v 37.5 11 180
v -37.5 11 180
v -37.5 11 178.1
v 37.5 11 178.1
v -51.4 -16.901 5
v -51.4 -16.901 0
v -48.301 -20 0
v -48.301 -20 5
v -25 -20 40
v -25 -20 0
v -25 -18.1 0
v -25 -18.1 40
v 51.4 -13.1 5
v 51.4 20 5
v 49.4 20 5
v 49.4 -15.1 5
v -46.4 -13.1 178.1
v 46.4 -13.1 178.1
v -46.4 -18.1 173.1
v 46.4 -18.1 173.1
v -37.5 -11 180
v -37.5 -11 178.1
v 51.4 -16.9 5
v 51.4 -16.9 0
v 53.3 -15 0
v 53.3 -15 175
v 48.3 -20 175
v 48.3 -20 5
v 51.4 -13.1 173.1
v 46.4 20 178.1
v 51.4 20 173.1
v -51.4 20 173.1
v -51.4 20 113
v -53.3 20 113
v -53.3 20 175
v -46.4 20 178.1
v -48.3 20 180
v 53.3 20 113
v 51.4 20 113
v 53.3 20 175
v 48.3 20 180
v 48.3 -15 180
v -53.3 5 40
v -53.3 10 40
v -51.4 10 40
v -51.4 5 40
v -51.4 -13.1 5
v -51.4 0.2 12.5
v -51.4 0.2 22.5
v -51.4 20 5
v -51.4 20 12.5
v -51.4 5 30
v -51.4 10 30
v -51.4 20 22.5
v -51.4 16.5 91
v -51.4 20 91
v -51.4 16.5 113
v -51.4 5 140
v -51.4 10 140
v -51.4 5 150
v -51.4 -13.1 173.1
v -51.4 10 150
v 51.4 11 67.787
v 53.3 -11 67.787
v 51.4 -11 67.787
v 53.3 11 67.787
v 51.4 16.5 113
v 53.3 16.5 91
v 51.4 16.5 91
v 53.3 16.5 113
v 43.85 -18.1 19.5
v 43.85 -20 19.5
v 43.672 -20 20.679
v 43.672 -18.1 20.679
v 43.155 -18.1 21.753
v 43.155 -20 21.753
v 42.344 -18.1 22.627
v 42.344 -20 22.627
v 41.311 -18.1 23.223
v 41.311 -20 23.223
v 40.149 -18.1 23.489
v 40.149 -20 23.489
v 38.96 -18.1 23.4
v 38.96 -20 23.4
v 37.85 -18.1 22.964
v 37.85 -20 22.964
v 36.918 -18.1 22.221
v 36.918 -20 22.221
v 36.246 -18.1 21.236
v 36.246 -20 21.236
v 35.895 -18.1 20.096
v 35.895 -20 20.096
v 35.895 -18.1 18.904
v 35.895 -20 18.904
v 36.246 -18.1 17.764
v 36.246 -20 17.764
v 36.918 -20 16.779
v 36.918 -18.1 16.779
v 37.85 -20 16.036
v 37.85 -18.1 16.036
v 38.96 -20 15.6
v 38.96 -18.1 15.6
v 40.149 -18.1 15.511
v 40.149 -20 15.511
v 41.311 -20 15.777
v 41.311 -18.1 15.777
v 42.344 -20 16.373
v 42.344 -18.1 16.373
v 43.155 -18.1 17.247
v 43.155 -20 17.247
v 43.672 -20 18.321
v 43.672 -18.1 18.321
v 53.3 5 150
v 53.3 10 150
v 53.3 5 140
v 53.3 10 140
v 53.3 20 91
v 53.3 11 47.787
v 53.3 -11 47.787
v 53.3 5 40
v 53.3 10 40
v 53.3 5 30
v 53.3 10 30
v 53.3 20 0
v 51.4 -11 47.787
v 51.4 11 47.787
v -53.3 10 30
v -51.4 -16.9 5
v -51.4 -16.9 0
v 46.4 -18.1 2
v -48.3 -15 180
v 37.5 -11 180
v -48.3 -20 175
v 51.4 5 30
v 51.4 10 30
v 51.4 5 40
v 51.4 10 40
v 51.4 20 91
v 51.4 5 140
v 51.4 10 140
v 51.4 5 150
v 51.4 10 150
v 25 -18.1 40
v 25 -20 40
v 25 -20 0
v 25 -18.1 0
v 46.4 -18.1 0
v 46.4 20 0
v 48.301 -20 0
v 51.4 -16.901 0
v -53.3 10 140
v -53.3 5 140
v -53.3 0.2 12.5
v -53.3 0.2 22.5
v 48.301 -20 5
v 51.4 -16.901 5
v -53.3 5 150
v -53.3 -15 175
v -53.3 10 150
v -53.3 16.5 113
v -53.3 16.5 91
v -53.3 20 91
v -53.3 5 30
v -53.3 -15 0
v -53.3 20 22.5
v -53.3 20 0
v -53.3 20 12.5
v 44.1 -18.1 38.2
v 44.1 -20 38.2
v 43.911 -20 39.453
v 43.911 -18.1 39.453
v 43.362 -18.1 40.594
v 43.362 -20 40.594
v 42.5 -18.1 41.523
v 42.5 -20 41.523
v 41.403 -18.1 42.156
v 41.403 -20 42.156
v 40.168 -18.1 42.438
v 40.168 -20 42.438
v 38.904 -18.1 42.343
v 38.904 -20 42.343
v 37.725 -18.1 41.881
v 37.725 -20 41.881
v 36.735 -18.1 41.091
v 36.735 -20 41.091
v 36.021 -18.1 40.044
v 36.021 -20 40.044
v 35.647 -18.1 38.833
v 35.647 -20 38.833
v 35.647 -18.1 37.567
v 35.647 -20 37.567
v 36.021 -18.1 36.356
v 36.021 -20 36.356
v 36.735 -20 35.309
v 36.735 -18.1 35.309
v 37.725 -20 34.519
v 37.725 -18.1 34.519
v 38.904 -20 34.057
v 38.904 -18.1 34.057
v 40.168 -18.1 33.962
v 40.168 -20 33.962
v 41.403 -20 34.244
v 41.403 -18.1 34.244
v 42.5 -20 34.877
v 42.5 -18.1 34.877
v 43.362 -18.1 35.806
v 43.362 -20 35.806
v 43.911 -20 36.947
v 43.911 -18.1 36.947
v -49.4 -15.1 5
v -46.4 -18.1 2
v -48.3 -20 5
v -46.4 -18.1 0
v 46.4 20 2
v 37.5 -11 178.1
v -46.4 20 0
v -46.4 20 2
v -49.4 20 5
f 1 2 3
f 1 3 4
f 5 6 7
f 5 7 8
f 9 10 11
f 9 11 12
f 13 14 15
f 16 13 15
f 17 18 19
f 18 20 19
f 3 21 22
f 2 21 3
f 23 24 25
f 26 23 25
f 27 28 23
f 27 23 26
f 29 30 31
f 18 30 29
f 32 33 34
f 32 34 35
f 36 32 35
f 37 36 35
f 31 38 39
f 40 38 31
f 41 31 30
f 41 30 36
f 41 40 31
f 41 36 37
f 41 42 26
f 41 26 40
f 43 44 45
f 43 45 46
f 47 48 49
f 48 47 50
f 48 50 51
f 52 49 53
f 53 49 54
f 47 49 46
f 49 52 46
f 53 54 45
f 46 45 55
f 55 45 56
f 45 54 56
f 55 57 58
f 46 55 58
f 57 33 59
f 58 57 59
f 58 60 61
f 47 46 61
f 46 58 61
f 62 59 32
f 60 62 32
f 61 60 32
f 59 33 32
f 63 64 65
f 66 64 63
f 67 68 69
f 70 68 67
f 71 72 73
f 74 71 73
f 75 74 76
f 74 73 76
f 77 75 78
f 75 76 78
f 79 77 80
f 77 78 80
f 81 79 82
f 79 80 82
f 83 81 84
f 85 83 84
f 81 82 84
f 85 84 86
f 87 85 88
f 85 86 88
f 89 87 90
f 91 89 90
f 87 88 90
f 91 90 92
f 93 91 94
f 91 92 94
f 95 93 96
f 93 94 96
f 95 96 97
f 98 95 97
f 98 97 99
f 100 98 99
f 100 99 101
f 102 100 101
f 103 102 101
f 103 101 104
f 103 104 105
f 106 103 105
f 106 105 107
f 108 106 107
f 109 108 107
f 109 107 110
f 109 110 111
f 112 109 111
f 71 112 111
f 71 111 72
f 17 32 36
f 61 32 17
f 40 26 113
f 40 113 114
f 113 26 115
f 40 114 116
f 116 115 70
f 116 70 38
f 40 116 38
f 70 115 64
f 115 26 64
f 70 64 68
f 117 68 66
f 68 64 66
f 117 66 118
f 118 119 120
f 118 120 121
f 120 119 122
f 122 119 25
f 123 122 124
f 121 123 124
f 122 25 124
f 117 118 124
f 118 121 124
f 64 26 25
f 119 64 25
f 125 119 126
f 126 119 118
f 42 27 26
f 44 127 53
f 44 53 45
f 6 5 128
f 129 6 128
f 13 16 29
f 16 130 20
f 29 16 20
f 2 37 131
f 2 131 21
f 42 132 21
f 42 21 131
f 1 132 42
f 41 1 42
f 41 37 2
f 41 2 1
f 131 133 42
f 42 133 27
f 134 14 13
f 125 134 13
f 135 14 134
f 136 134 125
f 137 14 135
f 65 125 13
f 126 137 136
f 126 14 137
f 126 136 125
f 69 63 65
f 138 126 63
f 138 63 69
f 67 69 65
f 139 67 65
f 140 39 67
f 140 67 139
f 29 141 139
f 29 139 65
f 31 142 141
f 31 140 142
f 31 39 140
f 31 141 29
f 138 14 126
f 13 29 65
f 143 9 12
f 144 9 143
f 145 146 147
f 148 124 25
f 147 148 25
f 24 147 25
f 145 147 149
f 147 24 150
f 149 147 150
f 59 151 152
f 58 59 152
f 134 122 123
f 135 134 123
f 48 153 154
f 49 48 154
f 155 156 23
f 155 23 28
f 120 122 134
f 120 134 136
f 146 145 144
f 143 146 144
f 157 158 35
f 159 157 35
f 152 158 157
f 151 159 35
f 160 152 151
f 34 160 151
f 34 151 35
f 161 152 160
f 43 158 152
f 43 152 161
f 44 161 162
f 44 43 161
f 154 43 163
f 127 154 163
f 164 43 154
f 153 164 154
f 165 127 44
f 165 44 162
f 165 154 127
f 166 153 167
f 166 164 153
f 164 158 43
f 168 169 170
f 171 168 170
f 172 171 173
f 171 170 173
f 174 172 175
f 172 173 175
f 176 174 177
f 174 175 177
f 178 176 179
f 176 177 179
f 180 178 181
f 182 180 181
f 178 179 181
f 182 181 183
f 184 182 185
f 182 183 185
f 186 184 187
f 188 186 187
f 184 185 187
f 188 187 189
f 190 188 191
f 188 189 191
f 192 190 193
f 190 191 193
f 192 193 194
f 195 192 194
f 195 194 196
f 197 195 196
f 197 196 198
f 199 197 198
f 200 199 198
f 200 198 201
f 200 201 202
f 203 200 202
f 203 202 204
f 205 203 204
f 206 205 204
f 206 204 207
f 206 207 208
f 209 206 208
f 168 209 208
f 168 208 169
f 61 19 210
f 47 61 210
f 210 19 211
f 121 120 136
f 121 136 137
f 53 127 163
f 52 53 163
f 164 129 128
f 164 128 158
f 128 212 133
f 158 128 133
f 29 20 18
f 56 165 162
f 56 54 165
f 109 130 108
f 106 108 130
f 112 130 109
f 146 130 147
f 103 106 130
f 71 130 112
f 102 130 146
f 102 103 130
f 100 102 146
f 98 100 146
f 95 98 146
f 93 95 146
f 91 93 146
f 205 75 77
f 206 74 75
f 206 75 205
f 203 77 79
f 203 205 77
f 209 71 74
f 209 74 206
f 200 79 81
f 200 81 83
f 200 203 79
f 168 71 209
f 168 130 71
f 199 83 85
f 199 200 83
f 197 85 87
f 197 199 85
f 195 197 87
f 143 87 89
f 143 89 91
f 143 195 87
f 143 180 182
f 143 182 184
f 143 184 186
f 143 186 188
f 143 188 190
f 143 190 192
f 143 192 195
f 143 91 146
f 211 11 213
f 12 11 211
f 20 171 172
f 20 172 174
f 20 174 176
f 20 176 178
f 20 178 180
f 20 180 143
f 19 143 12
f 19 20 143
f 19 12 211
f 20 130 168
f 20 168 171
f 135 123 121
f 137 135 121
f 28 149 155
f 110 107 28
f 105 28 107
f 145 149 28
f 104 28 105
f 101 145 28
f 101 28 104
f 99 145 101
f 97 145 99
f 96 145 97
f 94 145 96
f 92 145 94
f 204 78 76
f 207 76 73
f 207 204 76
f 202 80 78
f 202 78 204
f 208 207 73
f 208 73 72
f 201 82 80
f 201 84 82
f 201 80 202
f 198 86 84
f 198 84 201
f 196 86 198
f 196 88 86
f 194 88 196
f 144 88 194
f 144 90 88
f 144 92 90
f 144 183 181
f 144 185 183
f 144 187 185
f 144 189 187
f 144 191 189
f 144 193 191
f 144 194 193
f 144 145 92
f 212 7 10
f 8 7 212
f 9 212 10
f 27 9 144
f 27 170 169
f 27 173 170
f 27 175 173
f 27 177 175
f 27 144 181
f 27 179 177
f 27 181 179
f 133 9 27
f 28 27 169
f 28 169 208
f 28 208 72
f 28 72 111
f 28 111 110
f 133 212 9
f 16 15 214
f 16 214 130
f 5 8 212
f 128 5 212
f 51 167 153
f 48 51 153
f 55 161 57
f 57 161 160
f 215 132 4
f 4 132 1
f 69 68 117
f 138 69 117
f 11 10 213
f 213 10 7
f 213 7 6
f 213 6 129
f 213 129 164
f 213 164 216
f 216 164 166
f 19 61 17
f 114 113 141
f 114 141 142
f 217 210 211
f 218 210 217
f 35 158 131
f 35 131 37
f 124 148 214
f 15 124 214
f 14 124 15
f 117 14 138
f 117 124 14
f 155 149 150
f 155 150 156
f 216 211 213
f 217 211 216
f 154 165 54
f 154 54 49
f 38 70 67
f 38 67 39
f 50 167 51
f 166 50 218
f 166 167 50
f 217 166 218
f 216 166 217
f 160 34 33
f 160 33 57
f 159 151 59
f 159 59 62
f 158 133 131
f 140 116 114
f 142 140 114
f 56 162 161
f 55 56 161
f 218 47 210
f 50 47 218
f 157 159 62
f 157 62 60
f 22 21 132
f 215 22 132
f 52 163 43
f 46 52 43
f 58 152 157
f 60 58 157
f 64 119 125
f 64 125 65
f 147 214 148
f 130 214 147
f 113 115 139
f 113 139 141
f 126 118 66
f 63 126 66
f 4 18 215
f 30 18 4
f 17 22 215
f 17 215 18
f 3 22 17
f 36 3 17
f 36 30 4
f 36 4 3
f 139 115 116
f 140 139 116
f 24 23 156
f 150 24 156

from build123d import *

# Parameters (mm, degrees)
SKETCH_W        = 106.6
SKETCH_H        = 40
PAD_DEPTH       = 180
SKETCH001_W     = 102.8
SKETCH001_H     = 176.2
POCKET_DEPTH    = 38.1
SKETCH002_W     = 102.8
SKETCH002_H     = 1.9
POCKET001_DEPTH = 38.1
SKETCH003_W     = 50
SKETCH003_H     = 40
POCKET002_DEPTH = 5
SKETCH004_W     = 22
SKETCH004_H     = 20
POCKET003_DEPTH = 5
SKETCH005_W     = 75
SKETCH005_H     = 22
POCKET004_DEPTH = 5
SKETCH006_R     = 4
SKETCH006_R_2   = 4.25
POCKET005_DEPTH = 5
CHAMFER_SIZE    = 5
CHAMFER001_SIZE = 5
SKETCH007_W     = 5
SKETCH007_H     = 10
POCKET006_DEPTH = 5
SKETCH008_W     = 5
SKETCH008_H     = 10
POCKET007_DEPTH = 5
SKETCH009_W     = 19.8
SKETCH009_H     = 10
POCKET008_DEPTH = 5
SKETCH010_W     = 40
SKETCH010_H     = 5
PAD001_DEPTH    = 5
CHAMFER002_SIZE = 3.099
CHAMFER003_SIZE = 3
SKETCH011_W     = 40
SKETCH011_H     = 5
PAD002_DEPTH    = 5
CHAMFER004_SIZE = 3.099
CHAMFER005_SIZE = 3
SKETCH012_W     = 3.5
SKETCH012_H     = 22
POCKET009_DEPTH = 5
SKETCH013_W     = 3.5
SKETCH013_H     = 22
POCKET010_DEPTH = 5


with BuildPart() as part:
    # Sketch → Pad (new body)
    with BuildSketch(Plane.XY):
        Rectangle(SKETCH_W, SKETCH_H)
    extrude(amount=PAD_DEPTH)

    # Sketch001 (on Face1 of Pad) → Pocket (cut)
    with BuildSketch(Plane(origin=(0, 20, 0), x_dir=(-1, 0, 0), z_dir=(0, 1, 0))):
        with Locations((0, 90)):
            Rectangle(SKETCH001_W, SKETCH001_H)
    extrude(amount=-POCKET_DEPTH, mode=Mode.SUBTRACT)

    # Sketch002 (on Face1 of Pocket) → Pocket001 (cut)
    with BuildSketch(Plane(origin=(0, 20, 0), x_dir=(-1, 0, 0), z_dir=(0, 1, 0))):
        with Locations((0, 0.95)):
            Rectangle(SKETCH002_W, SKETCH002_H)
    extrude(amount=-POCKET001_DEPTH, mode=Mode.SUBTRACT)

    # Sketch003 (on Face11 of Pocket001) → Pocket002 (cut)
    with BuildSketch(Plane.XZ.offset(20)):
        with Locations((0, 20)):
            Rectangle(SKETCH003_W, SKETCH003_H)
    extrude(amount=-POCKET002_DEPTH, mode=Mode.SUBTRACT)

    # Sketch004 (on Face9 of Pocket002) → Pocket003 (cut)
    with BuildSketch(Plane.YZ.offset(53.3)):
        with Locations((0, 57.78728)):
            Rectangle(SKETCH004_W, SKETCH004_H)
    extrude(amount=-POCKET003_DEPTH, mode=Mode.SUBTRACT)

    # Sketch005 (on Face10 of Pocket003) → Pocket004 (cut)
    with BuildSketch(Plane.XY.offset(180)):
        Rectangle(SKETCH005_W, SKETCH005_H)
    extrude(amount=-POCKET004_DEPTH, mode=Mode.SUBTRACT)

    # Sketch006 (on Face12 of Pocket004) → Pocket005 (cut)
    with BuildSketch(Plane.XZ.offset(20)):
        with Locations((39.85, 19.5)):
            Circle(SKETCH006_R)
        with Locations((39.85, 38.2)):
            Circle(SKETCH006_R_2)
    extrude(amount=-POCKET005_DEPTH, mode=Mode.SUBTRACT)

    # Chamfer
    chamfer_edges = [part.edges().sort_by_distance(p)[0] for p in [
        (-51.4, -18.1, 90),
        (-51.4, 0.95, 178.1),
        (0, -18.1, 178.1),
        (51.4, -18.1, 90),
        (51.4, 0.95, 178.1),
    ]]
    chamfer(chamfer_edges, length=CHAMFER_SIZE)

    # Chamfer001
    chamfer001_edges = [part.edges().sort_by_distance(p)[0] for p in [
        (53.3, -20, 90),
        (-53.3, -20, 90),
        (0, -20, 180),
        (53.3, 0, 180),
        (-53.3, 0, 180),
    ]]
    chamfer(chamfer001_edges, length=CHAMFER001_SIZE)

    # Sketch007 (on Face9 of Chamfer001) → Pocket006 (cut)
    with BuildSketch(Plane.YZ.offset(53.3)):
        with Locations((7.5, 145)):
            Rectangle(SKETCH007_W, SKETCH007_H)
        with Locations((7.5, 35)):
            Rectangle(SKETCH007_W, SKETCH007_H)
    extrude(amount=-POCKET006_DEPTH, mode=Mode.SUBTRACT)

    # Sketch008 (on Face2 of Pocket006) → Pocket007 (cut)
    with BuildSketch(Plane(origin=(-53.3, 0, 0), x_dir=(0, -1, 0), z_dir=(-1, 0, 0))):
        with Locations((-7.5, 145)):
            Rectangle(SKETCH008_W, SKETCH008_H)
        with Locations((-7.5, 35)):
            Rectangle(SKETCH008_W, SKETCH008_H)
    extrude(amount=-POCKET007_DEPTH, mode=Mode.SUBTRACT)

    # Sketch009 (on Face2 of Pocket007) → Pocket008 (cut)
    with BuildSketch(Plane(origin=(-53.3, 0, 0), x_dir=(0, -1, 0), z_dir=(-1, 0, 0))):
        with Locations((-10.1, 17.5)):
            Rectangle(SKETCH009_W, SKETCH009_H)
    extrude(amount=-POCKET008_DEPTH, mode=Mode.SUBTRACT)

    # Sketch010 (on Face4 of Pocket008) → Pad001 (join)
    with BuildSketch(Plane.YZ.offset(-51.4)):
        with Locations((0, 2.5)):
            Rectangle(SKETCH010_W, SKETCH010_H)
    extrude(amount=PAD001_DEPTH)

    # Chamfer002
    chamfer002_edges = [part.edges().sort_by_distance(p)[0] for p in [
        (-51.4, -20, 2.5),
    ]]
    chamfer(chamfer002_edges, length=CHAMFER002_SIZE)

    # Chamfer003
    chamfer003_edges = [part.edges().sort_by_distance(p)[0] for p in [
        (-46.4, 0.95, 5),
    ]]
    chamfer(chamfer003_edges, length=CHAMFER003_SIZE)

    # Sketch011 (on Face27 of Chamfer003) → Pad002 (join)
    with BuildSketch(Plane(origin=(51.4, 0, 0), x_dir=(0, -1, 0), z_dir=(-1, 0, 0))):
        with Locations((0, 2.5)):
            Rectangle(SKETCH011_W, SKETCH011_H)
    extrude(amount=PAD002_DEPTH)

    # Chamfer004
    chamfer004_edges = [part.edges().sort_by_distance(p)[0] for p in [
        (51.4, -20, 2.5),
    ]]
    chamfer(chamfer004_edges, length=CHAMFER004_SIZE)

    # Chamfer005
    chamfer005_edges = [part.edges().sort_by_distance(p)[0] for p in [
        (46.4, 0.95, 5),
    ]]
    chamfer(chamfer005_edges, length=CHAMFER005_SIZE)

    # Sketch012 (on Face15 of Chamfer005) → Pocket009 (cut)
    with BuildSketch(Plane.YZ.offset(53.3)):
        with Locations((18.25, 102)):
            Rectangle(SKETCH012_W, SKETCH012_H)
    extrude(amount=-POCKET009_DEPTH, mode=Mode.SUBTRACT)

    # Sketch013 (on Face52 of Pocket009) → Pocket010 (cut)
    with BuildSketch(Plane(origin=(-53.3, 0, 0), x_dir=(0, -1, 0), z_dir=(-1, 0, 0))):
        with Locations((-18.25, 102)):
            Rectangle(SKETCH013_W, SKETCH013_H)
    extrude(amount=-POCKET010_DEPTH, mode=Mode.SUBTRACT)


solid = part.part
